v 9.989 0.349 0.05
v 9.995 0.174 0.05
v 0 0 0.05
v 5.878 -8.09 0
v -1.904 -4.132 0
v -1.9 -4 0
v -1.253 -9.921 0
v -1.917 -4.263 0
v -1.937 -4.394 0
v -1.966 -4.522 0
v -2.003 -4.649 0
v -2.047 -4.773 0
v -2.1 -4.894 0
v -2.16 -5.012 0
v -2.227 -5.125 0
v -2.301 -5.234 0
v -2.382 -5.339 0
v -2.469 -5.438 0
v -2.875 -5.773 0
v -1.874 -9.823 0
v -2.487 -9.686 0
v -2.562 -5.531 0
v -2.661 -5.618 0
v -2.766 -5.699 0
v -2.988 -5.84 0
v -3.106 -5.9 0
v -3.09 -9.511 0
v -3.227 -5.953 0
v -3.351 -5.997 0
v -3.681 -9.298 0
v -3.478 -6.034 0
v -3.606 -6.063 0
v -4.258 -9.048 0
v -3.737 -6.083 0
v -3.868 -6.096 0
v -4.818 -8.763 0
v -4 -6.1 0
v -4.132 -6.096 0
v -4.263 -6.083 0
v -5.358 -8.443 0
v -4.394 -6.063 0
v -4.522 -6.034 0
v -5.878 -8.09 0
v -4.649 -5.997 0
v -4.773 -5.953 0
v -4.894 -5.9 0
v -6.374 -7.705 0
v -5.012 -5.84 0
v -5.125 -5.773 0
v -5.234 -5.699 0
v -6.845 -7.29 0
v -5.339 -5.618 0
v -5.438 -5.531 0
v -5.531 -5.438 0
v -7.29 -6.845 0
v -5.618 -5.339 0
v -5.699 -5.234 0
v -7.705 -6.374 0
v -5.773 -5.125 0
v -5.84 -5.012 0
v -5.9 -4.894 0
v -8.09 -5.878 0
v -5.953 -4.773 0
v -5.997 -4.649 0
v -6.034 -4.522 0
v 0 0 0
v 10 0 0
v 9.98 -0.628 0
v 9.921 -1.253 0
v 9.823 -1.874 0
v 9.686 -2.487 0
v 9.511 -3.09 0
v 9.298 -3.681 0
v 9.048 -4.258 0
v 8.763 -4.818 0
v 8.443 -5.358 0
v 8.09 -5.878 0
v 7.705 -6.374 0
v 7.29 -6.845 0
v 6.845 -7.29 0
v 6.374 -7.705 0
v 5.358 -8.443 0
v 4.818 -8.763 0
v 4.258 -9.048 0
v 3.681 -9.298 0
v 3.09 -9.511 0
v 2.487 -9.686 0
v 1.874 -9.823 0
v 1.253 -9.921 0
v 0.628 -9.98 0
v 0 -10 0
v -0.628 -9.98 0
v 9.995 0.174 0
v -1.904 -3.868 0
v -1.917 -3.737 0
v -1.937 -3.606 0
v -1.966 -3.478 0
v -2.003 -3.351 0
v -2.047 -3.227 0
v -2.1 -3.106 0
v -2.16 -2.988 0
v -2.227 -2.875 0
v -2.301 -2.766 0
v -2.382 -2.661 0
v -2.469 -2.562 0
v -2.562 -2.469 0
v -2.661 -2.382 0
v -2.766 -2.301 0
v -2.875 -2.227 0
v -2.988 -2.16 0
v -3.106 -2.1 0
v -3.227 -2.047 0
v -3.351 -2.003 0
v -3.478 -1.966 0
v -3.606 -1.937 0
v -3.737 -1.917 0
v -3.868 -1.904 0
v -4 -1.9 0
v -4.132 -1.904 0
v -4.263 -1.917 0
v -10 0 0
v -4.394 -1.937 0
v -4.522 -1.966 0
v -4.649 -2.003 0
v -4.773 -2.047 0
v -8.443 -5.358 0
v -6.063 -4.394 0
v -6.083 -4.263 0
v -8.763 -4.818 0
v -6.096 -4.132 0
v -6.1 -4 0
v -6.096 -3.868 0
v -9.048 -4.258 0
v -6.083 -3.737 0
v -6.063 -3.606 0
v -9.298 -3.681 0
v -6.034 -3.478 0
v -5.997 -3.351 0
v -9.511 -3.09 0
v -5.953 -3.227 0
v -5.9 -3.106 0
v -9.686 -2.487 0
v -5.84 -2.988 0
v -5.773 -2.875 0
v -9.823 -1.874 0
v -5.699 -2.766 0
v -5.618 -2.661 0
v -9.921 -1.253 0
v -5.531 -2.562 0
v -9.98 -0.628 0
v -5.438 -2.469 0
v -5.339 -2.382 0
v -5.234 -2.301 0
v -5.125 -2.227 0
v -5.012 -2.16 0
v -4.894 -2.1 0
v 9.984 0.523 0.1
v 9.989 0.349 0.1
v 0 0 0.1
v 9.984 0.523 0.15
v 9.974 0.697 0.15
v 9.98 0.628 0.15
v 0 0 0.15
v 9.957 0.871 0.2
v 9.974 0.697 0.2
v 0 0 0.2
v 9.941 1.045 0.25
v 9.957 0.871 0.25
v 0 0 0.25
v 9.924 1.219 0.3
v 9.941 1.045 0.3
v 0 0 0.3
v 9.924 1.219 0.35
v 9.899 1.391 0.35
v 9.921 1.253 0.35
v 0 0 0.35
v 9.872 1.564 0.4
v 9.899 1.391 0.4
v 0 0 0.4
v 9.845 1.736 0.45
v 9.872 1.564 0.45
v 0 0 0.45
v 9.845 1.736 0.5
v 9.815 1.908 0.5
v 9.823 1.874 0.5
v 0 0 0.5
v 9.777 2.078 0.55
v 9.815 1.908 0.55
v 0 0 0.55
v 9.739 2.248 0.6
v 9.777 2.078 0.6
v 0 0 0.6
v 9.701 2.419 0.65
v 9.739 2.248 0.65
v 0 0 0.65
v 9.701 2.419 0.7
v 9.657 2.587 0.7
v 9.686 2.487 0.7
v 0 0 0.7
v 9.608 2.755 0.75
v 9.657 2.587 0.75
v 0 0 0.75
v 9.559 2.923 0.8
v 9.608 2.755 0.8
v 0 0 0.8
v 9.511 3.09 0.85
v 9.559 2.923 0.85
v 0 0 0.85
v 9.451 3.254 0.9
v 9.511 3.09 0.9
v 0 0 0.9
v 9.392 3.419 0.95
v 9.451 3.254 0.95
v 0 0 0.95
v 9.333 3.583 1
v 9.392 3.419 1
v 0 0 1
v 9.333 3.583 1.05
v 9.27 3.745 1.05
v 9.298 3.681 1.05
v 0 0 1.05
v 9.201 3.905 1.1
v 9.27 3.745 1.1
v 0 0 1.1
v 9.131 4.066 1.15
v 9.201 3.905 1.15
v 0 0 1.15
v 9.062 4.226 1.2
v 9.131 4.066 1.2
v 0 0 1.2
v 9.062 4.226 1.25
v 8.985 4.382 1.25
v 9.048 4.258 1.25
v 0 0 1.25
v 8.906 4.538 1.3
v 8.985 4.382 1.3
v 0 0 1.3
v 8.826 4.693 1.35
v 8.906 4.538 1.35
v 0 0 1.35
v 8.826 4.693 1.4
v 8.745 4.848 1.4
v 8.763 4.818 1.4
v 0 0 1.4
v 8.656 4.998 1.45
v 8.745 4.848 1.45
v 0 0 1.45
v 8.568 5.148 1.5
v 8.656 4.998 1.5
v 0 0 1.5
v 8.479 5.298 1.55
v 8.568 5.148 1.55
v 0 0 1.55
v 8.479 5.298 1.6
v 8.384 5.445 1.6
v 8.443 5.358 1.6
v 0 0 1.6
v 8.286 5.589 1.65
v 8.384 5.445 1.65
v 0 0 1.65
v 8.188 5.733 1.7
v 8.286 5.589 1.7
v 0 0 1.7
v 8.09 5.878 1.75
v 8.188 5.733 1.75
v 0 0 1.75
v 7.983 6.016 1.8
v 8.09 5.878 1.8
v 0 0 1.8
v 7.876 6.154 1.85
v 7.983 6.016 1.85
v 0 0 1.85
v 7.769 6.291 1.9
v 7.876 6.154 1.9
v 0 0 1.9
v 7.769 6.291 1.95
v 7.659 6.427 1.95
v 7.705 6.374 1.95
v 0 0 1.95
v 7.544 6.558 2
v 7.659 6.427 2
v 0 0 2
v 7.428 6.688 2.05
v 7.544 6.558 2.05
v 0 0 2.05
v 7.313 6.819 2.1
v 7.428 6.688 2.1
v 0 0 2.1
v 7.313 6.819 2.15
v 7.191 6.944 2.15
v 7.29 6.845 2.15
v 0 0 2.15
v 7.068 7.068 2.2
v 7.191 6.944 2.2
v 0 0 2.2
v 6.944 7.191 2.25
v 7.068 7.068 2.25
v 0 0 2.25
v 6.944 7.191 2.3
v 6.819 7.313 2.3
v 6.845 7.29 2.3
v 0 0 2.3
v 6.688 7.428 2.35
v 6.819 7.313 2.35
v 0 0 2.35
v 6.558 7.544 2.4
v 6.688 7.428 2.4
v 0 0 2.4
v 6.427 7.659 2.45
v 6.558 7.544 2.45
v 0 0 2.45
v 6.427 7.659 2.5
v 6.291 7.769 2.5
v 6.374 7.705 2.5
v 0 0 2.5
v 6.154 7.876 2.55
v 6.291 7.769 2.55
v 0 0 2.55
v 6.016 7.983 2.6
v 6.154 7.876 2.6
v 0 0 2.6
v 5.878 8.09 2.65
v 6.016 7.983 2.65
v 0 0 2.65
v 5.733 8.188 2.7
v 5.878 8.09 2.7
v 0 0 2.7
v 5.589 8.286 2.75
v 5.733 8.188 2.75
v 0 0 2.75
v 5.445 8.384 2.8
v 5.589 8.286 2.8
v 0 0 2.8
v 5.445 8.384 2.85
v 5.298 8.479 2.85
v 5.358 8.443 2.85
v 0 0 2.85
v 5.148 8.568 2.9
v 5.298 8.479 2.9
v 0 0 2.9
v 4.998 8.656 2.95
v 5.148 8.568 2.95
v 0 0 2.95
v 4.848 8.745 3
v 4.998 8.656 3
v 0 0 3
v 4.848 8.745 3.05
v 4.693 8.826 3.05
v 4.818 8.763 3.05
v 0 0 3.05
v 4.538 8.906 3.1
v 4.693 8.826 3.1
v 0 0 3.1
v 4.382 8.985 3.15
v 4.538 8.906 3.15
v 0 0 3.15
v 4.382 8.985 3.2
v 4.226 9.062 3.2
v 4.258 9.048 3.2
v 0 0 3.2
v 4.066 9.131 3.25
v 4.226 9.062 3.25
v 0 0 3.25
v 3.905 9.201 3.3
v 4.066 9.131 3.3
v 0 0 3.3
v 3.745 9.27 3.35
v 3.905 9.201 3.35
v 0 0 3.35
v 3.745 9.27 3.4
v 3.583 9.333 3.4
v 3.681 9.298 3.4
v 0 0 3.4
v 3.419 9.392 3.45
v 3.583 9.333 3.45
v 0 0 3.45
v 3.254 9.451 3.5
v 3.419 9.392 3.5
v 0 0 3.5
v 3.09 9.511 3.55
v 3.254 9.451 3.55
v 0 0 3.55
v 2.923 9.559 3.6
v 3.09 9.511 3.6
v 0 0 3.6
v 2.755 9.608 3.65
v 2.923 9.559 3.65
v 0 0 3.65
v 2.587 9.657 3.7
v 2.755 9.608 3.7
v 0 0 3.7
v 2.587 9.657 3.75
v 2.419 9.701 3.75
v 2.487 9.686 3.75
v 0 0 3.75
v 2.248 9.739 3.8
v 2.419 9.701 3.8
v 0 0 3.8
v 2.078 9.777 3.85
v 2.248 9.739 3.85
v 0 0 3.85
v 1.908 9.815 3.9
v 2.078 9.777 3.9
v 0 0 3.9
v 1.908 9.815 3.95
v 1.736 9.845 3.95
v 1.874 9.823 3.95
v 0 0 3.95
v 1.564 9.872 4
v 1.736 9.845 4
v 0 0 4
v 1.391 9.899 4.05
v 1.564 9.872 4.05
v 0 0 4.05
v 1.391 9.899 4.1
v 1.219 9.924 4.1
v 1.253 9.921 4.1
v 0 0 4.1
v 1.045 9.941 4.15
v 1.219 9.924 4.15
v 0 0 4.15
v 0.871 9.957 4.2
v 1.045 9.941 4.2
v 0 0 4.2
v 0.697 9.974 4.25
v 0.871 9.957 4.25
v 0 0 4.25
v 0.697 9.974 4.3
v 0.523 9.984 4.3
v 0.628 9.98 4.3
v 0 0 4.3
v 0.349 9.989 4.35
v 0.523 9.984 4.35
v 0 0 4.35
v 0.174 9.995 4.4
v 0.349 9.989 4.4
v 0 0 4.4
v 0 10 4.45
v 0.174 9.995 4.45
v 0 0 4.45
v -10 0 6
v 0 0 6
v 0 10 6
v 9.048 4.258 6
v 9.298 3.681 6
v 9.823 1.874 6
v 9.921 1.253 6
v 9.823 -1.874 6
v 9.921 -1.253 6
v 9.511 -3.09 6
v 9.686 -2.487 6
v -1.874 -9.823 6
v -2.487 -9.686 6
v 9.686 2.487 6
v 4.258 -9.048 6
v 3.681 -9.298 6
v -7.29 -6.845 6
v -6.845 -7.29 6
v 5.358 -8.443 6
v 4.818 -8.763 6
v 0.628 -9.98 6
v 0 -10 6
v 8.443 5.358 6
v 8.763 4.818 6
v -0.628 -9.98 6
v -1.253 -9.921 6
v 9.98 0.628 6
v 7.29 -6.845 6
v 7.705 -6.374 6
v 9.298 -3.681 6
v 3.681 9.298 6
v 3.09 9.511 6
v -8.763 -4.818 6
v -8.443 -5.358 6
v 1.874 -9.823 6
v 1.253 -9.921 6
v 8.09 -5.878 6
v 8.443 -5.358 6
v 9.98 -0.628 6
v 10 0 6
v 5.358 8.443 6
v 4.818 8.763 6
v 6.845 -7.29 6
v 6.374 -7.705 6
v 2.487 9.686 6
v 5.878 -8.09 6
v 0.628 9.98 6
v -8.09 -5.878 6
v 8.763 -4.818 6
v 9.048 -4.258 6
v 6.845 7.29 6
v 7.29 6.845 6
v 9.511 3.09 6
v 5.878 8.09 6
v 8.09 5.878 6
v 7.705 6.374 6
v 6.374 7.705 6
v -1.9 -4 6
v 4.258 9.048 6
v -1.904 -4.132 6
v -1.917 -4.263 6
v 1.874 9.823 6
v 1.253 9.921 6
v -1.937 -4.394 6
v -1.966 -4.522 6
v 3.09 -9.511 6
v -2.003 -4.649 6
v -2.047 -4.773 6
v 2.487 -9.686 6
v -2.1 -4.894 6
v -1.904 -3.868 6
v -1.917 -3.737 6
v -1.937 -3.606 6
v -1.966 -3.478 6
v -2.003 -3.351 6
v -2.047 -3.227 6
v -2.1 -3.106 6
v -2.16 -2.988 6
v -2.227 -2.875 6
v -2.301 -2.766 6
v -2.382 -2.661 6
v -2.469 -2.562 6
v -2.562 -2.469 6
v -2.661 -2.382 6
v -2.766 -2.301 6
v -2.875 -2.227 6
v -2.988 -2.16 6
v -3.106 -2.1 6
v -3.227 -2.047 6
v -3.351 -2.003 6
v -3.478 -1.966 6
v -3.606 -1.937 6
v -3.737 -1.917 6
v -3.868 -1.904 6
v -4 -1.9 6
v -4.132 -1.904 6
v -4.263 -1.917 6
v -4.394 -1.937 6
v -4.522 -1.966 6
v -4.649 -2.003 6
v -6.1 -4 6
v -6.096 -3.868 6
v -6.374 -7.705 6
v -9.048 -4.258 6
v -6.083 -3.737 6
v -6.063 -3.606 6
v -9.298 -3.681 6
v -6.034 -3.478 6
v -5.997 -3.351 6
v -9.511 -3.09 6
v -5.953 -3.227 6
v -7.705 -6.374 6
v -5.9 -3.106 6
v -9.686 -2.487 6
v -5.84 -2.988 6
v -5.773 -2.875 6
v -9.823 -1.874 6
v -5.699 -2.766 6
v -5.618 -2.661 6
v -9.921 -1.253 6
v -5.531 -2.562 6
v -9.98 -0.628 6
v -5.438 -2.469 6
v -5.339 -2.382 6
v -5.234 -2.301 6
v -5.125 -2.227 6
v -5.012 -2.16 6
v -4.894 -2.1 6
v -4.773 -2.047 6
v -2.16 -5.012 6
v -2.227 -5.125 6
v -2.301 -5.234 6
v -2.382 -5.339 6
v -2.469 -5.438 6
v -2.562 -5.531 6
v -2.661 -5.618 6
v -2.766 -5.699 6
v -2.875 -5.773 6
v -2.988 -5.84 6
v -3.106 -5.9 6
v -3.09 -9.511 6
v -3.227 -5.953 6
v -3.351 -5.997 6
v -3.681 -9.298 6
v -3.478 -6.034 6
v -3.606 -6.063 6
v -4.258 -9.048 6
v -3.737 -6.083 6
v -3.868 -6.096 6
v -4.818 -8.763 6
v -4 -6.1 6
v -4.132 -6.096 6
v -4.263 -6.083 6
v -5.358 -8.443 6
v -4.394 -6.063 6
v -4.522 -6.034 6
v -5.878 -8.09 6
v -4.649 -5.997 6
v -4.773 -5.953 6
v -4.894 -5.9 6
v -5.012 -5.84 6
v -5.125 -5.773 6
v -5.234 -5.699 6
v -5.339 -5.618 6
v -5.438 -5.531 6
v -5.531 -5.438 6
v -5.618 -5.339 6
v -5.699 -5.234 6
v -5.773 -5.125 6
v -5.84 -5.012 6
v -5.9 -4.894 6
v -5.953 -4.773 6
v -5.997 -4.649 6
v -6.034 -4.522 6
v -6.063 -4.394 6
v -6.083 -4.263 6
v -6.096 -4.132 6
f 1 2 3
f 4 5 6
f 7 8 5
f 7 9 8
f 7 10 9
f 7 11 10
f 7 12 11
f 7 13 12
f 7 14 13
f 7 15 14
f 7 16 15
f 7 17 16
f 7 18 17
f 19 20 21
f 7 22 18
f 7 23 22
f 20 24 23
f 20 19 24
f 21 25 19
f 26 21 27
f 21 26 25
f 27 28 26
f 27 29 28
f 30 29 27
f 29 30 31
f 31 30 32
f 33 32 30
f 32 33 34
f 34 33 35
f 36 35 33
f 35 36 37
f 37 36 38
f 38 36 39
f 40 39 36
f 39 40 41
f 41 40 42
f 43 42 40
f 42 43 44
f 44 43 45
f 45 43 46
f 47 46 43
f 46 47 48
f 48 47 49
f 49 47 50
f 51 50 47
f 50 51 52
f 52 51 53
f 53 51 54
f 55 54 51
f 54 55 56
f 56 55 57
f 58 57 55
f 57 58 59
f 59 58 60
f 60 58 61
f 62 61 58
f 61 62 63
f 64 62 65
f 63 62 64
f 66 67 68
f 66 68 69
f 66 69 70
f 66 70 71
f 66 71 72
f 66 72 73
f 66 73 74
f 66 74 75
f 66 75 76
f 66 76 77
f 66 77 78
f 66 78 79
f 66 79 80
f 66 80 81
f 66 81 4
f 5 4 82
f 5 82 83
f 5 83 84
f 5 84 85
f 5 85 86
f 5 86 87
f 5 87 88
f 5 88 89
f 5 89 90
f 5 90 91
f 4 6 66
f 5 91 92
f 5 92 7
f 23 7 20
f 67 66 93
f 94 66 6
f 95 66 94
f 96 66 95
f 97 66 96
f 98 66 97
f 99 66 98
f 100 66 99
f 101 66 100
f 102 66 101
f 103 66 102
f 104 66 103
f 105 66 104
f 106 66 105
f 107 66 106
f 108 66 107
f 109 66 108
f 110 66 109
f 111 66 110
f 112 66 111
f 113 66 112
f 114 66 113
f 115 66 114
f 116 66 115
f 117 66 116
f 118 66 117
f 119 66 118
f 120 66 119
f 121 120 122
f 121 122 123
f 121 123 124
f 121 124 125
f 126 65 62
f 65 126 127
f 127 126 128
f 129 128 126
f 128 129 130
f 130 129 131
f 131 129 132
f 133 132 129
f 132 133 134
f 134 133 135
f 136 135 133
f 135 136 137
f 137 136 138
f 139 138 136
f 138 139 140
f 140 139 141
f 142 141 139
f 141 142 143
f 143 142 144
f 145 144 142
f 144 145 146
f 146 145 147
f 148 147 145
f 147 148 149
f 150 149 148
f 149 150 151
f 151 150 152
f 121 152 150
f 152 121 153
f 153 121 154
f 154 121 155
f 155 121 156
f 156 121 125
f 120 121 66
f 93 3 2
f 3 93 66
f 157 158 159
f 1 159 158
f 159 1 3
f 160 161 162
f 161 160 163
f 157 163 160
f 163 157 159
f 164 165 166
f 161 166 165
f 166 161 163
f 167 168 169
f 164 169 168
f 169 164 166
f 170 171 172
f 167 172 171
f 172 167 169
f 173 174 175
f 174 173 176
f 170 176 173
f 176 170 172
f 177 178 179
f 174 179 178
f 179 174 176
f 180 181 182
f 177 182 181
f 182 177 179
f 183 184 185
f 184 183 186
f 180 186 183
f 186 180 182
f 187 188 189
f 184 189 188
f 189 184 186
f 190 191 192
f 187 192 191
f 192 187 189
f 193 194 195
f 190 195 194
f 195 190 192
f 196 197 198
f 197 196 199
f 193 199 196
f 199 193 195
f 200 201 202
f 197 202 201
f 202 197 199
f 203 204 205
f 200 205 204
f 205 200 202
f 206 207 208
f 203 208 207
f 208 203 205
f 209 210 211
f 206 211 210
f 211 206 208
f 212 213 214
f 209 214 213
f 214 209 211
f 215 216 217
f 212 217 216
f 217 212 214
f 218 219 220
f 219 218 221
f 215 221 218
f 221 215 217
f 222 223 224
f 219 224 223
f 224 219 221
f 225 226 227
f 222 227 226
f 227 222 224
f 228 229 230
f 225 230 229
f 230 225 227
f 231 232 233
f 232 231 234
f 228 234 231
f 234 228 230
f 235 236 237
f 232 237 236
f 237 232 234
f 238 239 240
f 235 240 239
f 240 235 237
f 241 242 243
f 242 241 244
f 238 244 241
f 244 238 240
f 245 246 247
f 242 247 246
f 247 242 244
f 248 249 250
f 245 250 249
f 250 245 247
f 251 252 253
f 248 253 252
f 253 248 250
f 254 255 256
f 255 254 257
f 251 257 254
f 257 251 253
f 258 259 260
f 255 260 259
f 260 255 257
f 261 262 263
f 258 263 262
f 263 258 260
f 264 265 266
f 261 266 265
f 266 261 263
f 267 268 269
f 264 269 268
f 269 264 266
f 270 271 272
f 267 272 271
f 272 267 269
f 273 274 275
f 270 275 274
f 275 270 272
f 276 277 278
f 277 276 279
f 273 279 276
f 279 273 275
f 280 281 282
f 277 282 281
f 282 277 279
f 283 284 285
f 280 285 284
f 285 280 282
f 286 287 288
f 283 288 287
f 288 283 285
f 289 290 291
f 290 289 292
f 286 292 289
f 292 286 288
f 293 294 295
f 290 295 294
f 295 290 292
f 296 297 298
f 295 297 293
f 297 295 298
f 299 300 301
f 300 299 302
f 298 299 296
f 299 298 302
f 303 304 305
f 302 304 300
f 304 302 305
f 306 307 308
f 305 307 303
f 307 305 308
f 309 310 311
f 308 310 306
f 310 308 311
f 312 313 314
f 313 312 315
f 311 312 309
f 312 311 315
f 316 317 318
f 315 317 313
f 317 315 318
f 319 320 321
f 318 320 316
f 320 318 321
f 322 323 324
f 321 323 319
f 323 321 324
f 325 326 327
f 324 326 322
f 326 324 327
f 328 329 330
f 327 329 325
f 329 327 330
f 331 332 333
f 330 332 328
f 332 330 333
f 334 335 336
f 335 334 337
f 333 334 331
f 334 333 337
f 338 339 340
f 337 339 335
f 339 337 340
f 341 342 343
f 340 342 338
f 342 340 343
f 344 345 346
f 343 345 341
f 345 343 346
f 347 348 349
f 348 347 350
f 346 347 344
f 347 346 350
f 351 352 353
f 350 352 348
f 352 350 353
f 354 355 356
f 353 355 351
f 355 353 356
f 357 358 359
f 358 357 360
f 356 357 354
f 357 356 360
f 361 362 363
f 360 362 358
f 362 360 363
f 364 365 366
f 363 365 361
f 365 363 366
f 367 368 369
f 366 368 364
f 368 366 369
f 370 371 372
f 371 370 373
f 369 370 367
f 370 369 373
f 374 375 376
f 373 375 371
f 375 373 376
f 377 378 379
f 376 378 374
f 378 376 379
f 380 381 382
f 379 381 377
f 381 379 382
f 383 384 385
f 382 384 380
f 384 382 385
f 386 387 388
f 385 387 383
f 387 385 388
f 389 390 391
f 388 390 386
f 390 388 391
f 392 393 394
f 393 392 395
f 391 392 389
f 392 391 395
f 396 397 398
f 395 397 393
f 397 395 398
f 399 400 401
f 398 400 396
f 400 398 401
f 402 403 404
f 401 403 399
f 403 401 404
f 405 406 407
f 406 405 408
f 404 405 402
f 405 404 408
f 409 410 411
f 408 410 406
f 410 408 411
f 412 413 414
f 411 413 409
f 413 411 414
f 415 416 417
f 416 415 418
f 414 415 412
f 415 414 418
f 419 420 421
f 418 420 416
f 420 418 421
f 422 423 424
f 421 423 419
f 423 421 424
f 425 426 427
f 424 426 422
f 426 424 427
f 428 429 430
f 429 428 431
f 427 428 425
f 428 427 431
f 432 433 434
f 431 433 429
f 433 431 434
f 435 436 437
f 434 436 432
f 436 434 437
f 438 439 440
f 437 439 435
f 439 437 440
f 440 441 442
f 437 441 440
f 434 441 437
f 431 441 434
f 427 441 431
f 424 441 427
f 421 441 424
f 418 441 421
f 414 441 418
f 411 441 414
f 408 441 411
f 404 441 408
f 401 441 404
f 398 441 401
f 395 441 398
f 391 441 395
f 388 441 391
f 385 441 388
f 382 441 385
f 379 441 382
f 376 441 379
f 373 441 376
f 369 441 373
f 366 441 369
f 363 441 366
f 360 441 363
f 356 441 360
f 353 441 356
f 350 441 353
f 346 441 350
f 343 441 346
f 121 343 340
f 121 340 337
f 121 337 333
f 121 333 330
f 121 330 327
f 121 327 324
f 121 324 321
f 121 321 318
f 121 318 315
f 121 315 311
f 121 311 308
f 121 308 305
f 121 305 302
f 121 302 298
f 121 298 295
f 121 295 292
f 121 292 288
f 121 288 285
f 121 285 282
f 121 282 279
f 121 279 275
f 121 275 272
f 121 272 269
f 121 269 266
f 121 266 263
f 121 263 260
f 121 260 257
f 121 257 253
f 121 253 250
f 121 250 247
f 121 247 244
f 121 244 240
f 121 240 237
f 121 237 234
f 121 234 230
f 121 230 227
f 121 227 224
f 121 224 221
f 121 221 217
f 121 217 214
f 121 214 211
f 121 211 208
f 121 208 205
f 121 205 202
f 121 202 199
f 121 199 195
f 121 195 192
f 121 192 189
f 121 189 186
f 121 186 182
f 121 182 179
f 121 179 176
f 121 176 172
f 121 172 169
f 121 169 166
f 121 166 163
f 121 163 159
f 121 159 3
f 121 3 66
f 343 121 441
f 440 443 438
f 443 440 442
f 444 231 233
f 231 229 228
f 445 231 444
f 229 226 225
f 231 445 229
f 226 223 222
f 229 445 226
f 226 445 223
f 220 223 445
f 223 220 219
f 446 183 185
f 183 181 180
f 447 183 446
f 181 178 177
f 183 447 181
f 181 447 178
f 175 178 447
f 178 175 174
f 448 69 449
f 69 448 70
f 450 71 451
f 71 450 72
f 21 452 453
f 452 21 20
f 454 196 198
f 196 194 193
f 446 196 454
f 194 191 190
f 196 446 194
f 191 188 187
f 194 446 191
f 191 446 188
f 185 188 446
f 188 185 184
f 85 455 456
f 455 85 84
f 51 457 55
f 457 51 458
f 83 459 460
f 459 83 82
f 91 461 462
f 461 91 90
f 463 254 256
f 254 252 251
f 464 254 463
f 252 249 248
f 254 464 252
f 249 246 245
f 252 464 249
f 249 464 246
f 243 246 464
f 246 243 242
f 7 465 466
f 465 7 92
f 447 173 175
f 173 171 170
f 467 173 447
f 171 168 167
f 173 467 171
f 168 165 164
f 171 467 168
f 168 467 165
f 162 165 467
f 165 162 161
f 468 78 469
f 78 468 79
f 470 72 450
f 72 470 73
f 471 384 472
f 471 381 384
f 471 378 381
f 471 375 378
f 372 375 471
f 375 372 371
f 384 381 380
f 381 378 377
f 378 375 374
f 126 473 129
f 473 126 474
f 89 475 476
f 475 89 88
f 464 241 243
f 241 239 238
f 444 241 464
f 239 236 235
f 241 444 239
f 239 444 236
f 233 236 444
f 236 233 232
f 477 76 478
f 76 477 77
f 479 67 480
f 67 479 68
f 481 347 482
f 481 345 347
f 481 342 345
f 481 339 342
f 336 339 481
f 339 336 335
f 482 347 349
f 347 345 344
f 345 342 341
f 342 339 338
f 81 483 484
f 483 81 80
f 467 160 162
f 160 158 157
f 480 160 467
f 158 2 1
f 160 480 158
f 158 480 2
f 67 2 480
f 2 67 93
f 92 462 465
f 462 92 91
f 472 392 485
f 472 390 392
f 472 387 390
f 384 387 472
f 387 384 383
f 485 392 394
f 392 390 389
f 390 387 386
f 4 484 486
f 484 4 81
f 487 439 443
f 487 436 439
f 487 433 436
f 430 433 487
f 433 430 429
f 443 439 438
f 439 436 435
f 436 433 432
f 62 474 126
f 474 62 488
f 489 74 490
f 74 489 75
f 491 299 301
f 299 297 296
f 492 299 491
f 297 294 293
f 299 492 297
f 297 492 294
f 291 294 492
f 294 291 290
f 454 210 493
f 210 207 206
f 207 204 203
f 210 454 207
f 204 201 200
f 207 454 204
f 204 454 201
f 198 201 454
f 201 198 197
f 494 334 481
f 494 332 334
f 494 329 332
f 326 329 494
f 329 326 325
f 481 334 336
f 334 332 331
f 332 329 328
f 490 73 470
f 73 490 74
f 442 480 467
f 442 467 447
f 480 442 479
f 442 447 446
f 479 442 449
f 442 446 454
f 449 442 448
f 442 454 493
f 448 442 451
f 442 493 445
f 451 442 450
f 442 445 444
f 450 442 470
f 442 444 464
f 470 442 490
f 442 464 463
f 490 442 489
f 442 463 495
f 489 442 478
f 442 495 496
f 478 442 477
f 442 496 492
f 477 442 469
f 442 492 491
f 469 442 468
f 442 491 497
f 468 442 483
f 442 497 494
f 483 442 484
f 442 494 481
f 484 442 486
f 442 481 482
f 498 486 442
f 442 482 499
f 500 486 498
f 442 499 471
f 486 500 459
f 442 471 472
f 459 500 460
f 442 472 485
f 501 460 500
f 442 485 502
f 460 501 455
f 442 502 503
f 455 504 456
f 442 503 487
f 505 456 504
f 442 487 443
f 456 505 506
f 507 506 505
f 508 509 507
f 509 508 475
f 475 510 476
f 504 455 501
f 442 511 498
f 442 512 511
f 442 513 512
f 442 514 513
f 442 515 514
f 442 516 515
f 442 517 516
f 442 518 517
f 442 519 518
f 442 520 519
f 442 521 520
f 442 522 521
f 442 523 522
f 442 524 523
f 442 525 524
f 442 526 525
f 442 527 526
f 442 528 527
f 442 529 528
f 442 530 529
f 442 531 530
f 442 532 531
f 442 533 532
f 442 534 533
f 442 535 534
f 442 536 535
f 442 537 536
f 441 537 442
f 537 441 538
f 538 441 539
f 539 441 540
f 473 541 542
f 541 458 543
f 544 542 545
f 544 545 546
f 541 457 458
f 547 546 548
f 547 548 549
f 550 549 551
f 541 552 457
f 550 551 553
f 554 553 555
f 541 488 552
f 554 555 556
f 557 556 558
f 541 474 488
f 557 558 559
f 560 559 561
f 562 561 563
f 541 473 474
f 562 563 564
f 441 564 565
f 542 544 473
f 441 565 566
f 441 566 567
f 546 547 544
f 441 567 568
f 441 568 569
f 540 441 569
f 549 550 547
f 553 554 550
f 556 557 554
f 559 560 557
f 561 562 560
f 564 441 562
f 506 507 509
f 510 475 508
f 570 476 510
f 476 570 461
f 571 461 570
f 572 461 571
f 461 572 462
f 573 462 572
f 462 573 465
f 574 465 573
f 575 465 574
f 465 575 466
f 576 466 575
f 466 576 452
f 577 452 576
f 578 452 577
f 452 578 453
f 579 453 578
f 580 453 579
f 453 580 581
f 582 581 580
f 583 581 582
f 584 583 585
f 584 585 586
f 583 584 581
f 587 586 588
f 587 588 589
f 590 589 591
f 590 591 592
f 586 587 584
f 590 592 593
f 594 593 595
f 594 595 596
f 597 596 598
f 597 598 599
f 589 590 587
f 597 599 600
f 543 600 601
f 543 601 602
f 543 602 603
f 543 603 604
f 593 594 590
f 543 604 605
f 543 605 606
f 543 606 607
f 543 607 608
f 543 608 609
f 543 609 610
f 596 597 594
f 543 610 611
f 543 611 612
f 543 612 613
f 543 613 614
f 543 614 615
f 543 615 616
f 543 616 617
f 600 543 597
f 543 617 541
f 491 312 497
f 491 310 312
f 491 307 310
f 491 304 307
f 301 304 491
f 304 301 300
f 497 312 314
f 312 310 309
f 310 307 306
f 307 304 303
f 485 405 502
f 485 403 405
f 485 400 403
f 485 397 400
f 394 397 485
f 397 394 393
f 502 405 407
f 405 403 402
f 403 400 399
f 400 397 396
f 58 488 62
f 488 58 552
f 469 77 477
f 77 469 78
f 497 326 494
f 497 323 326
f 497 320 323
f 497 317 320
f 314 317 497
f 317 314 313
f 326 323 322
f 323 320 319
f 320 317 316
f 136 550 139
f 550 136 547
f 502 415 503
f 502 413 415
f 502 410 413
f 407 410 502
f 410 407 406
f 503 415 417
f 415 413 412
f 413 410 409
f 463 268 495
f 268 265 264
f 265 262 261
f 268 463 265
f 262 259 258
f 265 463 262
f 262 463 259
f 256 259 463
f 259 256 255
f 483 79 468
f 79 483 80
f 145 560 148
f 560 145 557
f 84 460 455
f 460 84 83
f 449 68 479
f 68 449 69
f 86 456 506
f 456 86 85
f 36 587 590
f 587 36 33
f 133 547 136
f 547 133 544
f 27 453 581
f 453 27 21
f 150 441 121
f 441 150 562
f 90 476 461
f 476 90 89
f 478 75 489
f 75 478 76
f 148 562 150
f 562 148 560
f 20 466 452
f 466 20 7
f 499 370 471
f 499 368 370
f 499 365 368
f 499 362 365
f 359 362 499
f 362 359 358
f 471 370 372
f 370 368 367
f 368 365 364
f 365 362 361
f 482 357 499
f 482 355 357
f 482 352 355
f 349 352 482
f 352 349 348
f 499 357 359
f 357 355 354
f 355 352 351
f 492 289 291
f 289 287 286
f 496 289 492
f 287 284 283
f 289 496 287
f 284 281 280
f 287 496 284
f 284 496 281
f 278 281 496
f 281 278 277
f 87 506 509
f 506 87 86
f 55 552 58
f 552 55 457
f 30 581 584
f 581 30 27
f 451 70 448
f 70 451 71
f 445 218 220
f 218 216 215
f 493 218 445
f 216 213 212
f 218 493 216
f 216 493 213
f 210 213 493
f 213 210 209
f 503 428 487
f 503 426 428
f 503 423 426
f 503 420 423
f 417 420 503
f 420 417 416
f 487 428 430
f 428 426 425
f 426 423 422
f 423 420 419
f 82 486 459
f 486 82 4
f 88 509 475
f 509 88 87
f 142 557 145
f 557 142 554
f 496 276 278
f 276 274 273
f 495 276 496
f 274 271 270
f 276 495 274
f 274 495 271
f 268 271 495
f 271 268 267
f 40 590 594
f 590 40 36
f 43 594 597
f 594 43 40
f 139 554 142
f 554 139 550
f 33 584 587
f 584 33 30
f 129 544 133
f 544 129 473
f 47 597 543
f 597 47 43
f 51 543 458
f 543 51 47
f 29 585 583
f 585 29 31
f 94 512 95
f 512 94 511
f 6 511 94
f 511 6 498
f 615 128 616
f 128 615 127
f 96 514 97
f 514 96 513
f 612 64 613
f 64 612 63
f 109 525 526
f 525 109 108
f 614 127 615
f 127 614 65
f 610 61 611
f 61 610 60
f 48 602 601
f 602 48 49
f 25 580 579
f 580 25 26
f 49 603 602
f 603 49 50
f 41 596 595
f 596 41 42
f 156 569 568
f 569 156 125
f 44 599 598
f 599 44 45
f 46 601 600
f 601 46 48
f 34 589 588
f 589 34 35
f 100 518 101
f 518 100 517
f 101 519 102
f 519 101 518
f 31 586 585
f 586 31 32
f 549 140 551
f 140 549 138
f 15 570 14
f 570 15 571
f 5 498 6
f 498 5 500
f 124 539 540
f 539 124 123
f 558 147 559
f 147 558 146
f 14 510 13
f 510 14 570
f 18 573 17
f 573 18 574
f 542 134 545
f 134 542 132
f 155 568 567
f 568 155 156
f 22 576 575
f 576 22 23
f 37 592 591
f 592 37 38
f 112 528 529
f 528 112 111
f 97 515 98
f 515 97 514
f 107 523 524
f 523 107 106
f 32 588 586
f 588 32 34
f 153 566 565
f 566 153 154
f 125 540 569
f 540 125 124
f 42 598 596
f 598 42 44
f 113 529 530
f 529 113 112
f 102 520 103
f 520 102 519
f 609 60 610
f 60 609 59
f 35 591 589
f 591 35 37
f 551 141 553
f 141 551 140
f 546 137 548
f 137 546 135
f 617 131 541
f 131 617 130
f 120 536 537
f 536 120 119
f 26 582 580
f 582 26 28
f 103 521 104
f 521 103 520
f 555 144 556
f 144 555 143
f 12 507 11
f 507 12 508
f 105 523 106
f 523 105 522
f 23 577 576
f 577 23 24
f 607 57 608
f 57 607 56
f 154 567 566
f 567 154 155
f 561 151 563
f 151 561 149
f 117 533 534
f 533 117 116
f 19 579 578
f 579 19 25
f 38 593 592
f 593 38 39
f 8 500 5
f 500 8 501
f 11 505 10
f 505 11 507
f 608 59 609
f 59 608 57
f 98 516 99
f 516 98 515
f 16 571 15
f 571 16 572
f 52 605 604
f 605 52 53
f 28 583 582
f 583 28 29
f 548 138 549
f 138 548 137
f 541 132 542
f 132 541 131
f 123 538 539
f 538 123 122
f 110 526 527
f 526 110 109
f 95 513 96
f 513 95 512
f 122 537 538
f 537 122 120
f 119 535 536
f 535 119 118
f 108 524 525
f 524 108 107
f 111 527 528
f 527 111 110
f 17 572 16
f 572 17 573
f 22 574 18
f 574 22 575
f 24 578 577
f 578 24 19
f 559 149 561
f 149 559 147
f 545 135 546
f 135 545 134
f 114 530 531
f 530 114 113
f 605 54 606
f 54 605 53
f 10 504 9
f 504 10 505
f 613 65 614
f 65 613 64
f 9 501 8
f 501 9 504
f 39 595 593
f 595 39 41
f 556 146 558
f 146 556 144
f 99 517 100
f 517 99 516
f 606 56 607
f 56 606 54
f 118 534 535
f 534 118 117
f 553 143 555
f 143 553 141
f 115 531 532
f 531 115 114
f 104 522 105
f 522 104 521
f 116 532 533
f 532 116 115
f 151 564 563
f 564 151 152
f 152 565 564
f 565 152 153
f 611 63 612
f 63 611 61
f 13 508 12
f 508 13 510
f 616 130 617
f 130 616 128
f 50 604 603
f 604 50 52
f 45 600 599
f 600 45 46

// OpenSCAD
$fn=100;

radius = 10;
height = 6;

difference(){
    cylinder(r=radius,h=height);
 for (a =[0:1:90]){
     rotate(a) translate([0,0,0]) cube([radius,radius,a/20]);
 }
    translate([((-radius/2)+1),((-radius/2)+1),0]) cylinder(r=2.1,h=9);
    translate([-radius,0,0]) cube([radius,radius,radius]);
 }
